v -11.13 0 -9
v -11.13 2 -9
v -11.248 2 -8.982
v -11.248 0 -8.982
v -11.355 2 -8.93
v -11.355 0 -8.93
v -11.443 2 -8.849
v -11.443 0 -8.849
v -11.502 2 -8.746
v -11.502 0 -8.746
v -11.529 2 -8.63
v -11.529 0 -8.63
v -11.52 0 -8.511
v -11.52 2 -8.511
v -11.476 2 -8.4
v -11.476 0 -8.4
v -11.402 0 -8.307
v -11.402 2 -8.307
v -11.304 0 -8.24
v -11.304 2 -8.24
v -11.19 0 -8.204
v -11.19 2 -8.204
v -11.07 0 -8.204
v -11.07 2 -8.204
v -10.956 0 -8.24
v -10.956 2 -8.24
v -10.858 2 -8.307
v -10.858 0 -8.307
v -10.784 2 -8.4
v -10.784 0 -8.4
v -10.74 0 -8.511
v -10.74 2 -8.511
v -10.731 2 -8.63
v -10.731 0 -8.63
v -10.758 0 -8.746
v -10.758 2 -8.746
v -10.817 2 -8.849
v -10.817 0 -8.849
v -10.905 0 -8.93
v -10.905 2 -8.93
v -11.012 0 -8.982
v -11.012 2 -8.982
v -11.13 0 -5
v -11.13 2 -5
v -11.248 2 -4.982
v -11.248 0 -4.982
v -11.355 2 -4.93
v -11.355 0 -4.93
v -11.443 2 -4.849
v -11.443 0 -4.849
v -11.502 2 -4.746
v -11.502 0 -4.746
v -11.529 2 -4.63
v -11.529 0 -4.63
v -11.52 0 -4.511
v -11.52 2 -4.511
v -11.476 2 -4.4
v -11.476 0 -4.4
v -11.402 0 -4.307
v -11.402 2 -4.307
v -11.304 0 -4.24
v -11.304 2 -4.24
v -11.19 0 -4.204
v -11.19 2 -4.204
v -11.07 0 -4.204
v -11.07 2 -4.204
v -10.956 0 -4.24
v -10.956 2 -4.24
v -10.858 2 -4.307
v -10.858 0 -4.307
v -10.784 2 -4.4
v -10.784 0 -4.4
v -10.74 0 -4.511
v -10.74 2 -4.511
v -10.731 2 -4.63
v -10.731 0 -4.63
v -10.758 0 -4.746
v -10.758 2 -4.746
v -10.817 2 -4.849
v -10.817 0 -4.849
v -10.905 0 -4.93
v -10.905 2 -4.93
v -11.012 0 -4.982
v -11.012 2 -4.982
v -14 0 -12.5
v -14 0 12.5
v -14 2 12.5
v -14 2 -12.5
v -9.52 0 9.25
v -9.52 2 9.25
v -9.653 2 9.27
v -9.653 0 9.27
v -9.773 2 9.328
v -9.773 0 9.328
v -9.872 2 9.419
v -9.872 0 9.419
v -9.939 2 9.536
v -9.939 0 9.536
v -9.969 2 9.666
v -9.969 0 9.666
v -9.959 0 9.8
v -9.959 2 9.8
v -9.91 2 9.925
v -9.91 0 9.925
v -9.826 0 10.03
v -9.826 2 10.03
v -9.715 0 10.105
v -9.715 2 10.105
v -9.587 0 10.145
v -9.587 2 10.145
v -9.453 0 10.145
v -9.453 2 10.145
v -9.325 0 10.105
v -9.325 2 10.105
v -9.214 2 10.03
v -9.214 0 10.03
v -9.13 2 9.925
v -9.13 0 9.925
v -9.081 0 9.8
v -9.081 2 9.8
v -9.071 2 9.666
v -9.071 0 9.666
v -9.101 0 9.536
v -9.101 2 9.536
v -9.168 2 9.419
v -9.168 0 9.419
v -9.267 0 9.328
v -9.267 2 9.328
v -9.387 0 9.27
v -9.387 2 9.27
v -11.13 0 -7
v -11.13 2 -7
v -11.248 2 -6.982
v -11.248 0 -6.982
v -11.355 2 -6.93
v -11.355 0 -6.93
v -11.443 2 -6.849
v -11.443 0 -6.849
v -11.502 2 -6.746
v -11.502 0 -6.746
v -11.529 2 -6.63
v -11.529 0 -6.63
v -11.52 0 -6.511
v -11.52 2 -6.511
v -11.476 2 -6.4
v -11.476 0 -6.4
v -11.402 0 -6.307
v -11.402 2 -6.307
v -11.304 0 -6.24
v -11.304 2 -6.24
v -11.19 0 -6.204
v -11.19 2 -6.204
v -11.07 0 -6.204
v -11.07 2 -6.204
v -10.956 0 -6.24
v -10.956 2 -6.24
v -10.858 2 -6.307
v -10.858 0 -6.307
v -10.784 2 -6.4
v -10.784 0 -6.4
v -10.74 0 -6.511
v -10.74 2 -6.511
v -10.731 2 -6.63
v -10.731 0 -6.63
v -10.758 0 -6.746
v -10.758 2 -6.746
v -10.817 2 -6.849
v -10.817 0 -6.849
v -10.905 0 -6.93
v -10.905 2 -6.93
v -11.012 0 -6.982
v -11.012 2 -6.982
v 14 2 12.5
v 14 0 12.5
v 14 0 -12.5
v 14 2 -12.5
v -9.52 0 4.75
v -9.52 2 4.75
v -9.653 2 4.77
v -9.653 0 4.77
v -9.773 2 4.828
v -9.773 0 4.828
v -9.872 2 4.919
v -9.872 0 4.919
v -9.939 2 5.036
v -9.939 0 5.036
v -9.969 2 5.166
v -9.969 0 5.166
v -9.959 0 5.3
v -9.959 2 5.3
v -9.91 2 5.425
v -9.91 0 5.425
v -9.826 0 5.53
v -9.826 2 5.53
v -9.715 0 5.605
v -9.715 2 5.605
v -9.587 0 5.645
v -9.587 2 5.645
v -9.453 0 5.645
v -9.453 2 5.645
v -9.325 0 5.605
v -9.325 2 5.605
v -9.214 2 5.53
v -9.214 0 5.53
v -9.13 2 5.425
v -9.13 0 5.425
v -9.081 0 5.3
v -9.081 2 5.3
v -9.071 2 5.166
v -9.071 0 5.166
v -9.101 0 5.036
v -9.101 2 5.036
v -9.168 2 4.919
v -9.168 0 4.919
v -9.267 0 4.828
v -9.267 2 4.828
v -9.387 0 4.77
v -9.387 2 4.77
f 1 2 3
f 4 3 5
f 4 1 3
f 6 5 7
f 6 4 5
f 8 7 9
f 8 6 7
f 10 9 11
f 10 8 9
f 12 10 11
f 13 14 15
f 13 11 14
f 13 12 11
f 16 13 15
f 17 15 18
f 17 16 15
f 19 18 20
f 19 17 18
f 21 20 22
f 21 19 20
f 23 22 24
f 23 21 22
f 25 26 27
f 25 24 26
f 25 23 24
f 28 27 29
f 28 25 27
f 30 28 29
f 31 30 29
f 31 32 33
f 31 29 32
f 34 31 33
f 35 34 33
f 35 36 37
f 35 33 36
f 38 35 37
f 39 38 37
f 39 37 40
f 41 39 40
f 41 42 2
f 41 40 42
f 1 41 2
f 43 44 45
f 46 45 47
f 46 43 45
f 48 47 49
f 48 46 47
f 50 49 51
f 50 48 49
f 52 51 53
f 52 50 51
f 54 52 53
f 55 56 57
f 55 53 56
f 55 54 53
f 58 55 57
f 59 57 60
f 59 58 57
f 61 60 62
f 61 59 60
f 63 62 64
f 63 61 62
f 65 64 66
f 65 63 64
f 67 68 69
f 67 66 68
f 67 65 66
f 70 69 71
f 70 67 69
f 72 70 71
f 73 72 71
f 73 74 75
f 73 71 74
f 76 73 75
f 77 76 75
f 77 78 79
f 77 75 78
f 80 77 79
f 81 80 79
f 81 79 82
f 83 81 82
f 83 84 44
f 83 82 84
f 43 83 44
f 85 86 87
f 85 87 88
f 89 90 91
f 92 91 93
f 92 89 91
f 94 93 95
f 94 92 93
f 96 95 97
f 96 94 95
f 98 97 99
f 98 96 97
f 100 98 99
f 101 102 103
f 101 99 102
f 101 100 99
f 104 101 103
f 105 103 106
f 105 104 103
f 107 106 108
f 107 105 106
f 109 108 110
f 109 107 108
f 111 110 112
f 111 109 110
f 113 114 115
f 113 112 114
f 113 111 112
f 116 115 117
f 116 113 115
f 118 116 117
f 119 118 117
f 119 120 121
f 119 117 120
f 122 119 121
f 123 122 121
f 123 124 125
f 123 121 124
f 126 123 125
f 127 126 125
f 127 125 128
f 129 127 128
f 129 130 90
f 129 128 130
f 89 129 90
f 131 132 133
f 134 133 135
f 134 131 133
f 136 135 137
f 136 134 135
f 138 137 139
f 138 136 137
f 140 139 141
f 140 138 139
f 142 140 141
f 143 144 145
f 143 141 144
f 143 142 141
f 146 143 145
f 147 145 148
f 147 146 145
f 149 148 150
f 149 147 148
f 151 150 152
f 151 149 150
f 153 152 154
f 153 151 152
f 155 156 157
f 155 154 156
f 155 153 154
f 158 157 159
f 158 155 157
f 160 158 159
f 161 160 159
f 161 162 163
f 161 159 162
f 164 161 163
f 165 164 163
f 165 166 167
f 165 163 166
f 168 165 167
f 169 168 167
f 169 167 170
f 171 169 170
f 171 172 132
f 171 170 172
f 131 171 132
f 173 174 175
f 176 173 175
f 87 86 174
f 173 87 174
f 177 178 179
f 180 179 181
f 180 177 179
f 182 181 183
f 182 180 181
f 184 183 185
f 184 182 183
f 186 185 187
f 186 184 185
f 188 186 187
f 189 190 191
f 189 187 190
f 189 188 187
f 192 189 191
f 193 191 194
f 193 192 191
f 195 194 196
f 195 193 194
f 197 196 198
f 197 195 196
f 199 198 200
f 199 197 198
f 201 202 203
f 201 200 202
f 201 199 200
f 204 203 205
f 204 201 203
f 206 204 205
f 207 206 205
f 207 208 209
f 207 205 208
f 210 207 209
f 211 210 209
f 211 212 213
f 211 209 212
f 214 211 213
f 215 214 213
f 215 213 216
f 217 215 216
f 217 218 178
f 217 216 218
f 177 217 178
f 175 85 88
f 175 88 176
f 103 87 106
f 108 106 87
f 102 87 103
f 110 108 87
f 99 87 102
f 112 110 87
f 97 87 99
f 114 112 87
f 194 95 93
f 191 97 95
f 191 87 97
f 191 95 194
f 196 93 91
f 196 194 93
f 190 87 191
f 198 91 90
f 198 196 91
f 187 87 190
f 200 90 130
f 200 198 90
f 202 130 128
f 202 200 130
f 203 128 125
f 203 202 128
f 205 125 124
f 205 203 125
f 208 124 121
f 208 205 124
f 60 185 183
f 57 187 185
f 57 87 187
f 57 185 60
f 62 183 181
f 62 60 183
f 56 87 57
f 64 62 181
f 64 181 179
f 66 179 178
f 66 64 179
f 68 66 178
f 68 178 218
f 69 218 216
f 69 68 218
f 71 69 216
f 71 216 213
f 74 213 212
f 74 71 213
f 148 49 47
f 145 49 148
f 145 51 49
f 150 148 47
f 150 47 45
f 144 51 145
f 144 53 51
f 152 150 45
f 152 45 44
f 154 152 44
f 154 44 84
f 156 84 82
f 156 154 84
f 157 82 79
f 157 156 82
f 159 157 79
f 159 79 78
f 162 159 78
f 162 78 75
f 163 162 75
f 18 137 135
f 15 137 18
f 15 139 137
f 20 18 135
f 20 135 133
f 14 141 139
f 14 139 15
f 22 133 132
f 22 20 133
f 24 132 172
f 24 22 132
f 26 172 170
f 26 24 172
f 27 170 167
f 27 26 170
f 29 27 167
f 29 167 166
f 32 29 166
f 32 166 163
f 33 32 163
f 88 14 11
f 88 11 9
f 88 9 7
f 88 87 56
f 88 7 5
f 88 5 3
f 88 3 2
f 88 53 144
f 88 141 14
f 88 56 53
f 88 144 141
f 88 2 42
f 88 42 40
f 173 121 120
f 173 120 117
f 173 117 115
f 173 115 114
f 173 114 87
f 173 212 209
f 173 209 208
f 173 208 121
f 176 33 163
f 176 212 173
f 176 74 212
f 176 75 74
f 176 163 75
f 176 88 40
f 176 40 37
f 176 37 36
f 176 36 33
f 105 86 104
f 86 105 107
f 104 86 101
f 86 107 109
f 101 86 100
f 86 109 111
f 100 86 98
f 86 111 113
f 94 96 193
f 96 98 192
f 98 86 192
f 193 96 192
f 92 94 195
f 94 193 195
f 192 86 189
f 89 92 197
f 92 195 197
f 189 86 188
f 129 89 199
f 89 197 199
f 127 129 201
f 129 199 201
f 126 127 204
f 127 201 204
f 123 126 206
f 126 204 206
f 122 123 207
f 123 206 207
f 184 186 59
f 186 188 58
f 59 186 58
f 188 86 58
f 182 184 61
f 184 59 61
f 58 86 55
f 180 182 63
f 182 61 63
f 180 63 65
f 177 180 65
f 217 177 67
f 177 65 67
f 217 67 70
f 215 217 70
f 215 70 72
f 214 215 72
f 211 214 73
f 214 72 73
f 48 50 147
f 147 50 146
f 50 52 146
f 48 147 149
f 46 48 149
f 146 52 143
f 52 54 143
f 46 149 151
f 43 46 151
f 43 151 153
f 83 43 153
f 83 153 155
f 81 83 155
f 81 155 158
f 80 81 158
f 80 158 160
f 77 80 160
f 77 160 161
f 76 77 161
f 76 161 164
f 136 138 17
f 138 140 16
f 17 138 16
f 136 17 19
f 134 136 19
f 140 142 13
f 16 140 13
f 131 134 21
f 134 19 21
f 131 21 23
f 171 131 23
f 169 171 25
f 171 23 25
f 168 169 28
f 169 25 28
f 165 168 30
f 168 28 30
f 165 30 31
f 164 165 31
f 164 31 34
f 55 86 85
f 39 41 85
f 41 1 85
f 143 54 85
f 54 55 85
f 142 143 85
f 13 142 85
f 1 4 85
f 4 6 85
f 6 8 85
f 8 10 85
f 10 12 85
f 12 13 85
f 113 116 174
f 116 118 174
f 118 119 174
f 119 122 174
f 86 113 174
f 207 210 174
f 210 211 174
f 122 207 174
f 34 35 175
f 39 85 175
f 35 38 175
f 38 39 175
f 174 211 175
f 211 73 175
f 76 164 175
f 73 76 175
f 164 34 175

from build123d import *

# Parameters (mm, degrees)
SKETCH1_W           = 28
SKETCH1_H           = 25
BOSS_EXTRUDE1_DEPTH = 2
SKETCH2_R           = 0.45
CUT_EXTRUDE1_DEPTH  = 10
SKETCH3_R           = 0.4
CUT_EXTRUDE2_DEPTH  = 2.5


with BuildPart() as part:
    # Sketch1 → Boss-Extrude1 (new body)
    with BuildSketch(Plane(origin=(0, 0, 0), x_dir=(1, 0, 0), z_dir=(0, 1, 0))):
        Rectangle(SKETCH1_W, SKETCH1_H)
    extrude(amount=BOSS_EXTRUDE1_DEPTH)

    # Sketch2 → Cut-Extrude1 (cut)
    with BuildSketch(Plane(origin=(0, 0, 0), x_dir=(1, 0, 0), z_dir=(0, 1, 0))):
        with Locations(Location((-9.52, -5.2, 0), (0, 0, 90))):
            Circle(SKETCH2_R)
        with Locations(Location((-9.52, -9.7, 0), (0, 0, 90))):
            Circle(SKETCH2_R)
    extrude(amount=CUT_EXTRUDE1_DEPTH, mode=Mode.SUBTRACT)

    # Sketch3 → Cut-Extrude2 (cut)
    with BuildSketch(Plane(origin=(0, 0, 0), x_dir=(1, 0, 0), z_dir=(0, 1, 0))):
        with Locations(Location((-11.13, 6.6, 0), (0, 0, 90))):
            Circle(SKETCH3_R)
        with Locations(Location((-11.13, 8.6, 0), (0, 0, 90))):
            Circle(SKETCH3_R)
        with Locations(Location((-11.13, 4.6, 0), (0, 0, 90))):
            Circle(SKETCH3_R)
    extrude(amount=CUT_EXTRUDE2_DEPTH, mode=Mode.SUBTRACT)


solid = part.part
